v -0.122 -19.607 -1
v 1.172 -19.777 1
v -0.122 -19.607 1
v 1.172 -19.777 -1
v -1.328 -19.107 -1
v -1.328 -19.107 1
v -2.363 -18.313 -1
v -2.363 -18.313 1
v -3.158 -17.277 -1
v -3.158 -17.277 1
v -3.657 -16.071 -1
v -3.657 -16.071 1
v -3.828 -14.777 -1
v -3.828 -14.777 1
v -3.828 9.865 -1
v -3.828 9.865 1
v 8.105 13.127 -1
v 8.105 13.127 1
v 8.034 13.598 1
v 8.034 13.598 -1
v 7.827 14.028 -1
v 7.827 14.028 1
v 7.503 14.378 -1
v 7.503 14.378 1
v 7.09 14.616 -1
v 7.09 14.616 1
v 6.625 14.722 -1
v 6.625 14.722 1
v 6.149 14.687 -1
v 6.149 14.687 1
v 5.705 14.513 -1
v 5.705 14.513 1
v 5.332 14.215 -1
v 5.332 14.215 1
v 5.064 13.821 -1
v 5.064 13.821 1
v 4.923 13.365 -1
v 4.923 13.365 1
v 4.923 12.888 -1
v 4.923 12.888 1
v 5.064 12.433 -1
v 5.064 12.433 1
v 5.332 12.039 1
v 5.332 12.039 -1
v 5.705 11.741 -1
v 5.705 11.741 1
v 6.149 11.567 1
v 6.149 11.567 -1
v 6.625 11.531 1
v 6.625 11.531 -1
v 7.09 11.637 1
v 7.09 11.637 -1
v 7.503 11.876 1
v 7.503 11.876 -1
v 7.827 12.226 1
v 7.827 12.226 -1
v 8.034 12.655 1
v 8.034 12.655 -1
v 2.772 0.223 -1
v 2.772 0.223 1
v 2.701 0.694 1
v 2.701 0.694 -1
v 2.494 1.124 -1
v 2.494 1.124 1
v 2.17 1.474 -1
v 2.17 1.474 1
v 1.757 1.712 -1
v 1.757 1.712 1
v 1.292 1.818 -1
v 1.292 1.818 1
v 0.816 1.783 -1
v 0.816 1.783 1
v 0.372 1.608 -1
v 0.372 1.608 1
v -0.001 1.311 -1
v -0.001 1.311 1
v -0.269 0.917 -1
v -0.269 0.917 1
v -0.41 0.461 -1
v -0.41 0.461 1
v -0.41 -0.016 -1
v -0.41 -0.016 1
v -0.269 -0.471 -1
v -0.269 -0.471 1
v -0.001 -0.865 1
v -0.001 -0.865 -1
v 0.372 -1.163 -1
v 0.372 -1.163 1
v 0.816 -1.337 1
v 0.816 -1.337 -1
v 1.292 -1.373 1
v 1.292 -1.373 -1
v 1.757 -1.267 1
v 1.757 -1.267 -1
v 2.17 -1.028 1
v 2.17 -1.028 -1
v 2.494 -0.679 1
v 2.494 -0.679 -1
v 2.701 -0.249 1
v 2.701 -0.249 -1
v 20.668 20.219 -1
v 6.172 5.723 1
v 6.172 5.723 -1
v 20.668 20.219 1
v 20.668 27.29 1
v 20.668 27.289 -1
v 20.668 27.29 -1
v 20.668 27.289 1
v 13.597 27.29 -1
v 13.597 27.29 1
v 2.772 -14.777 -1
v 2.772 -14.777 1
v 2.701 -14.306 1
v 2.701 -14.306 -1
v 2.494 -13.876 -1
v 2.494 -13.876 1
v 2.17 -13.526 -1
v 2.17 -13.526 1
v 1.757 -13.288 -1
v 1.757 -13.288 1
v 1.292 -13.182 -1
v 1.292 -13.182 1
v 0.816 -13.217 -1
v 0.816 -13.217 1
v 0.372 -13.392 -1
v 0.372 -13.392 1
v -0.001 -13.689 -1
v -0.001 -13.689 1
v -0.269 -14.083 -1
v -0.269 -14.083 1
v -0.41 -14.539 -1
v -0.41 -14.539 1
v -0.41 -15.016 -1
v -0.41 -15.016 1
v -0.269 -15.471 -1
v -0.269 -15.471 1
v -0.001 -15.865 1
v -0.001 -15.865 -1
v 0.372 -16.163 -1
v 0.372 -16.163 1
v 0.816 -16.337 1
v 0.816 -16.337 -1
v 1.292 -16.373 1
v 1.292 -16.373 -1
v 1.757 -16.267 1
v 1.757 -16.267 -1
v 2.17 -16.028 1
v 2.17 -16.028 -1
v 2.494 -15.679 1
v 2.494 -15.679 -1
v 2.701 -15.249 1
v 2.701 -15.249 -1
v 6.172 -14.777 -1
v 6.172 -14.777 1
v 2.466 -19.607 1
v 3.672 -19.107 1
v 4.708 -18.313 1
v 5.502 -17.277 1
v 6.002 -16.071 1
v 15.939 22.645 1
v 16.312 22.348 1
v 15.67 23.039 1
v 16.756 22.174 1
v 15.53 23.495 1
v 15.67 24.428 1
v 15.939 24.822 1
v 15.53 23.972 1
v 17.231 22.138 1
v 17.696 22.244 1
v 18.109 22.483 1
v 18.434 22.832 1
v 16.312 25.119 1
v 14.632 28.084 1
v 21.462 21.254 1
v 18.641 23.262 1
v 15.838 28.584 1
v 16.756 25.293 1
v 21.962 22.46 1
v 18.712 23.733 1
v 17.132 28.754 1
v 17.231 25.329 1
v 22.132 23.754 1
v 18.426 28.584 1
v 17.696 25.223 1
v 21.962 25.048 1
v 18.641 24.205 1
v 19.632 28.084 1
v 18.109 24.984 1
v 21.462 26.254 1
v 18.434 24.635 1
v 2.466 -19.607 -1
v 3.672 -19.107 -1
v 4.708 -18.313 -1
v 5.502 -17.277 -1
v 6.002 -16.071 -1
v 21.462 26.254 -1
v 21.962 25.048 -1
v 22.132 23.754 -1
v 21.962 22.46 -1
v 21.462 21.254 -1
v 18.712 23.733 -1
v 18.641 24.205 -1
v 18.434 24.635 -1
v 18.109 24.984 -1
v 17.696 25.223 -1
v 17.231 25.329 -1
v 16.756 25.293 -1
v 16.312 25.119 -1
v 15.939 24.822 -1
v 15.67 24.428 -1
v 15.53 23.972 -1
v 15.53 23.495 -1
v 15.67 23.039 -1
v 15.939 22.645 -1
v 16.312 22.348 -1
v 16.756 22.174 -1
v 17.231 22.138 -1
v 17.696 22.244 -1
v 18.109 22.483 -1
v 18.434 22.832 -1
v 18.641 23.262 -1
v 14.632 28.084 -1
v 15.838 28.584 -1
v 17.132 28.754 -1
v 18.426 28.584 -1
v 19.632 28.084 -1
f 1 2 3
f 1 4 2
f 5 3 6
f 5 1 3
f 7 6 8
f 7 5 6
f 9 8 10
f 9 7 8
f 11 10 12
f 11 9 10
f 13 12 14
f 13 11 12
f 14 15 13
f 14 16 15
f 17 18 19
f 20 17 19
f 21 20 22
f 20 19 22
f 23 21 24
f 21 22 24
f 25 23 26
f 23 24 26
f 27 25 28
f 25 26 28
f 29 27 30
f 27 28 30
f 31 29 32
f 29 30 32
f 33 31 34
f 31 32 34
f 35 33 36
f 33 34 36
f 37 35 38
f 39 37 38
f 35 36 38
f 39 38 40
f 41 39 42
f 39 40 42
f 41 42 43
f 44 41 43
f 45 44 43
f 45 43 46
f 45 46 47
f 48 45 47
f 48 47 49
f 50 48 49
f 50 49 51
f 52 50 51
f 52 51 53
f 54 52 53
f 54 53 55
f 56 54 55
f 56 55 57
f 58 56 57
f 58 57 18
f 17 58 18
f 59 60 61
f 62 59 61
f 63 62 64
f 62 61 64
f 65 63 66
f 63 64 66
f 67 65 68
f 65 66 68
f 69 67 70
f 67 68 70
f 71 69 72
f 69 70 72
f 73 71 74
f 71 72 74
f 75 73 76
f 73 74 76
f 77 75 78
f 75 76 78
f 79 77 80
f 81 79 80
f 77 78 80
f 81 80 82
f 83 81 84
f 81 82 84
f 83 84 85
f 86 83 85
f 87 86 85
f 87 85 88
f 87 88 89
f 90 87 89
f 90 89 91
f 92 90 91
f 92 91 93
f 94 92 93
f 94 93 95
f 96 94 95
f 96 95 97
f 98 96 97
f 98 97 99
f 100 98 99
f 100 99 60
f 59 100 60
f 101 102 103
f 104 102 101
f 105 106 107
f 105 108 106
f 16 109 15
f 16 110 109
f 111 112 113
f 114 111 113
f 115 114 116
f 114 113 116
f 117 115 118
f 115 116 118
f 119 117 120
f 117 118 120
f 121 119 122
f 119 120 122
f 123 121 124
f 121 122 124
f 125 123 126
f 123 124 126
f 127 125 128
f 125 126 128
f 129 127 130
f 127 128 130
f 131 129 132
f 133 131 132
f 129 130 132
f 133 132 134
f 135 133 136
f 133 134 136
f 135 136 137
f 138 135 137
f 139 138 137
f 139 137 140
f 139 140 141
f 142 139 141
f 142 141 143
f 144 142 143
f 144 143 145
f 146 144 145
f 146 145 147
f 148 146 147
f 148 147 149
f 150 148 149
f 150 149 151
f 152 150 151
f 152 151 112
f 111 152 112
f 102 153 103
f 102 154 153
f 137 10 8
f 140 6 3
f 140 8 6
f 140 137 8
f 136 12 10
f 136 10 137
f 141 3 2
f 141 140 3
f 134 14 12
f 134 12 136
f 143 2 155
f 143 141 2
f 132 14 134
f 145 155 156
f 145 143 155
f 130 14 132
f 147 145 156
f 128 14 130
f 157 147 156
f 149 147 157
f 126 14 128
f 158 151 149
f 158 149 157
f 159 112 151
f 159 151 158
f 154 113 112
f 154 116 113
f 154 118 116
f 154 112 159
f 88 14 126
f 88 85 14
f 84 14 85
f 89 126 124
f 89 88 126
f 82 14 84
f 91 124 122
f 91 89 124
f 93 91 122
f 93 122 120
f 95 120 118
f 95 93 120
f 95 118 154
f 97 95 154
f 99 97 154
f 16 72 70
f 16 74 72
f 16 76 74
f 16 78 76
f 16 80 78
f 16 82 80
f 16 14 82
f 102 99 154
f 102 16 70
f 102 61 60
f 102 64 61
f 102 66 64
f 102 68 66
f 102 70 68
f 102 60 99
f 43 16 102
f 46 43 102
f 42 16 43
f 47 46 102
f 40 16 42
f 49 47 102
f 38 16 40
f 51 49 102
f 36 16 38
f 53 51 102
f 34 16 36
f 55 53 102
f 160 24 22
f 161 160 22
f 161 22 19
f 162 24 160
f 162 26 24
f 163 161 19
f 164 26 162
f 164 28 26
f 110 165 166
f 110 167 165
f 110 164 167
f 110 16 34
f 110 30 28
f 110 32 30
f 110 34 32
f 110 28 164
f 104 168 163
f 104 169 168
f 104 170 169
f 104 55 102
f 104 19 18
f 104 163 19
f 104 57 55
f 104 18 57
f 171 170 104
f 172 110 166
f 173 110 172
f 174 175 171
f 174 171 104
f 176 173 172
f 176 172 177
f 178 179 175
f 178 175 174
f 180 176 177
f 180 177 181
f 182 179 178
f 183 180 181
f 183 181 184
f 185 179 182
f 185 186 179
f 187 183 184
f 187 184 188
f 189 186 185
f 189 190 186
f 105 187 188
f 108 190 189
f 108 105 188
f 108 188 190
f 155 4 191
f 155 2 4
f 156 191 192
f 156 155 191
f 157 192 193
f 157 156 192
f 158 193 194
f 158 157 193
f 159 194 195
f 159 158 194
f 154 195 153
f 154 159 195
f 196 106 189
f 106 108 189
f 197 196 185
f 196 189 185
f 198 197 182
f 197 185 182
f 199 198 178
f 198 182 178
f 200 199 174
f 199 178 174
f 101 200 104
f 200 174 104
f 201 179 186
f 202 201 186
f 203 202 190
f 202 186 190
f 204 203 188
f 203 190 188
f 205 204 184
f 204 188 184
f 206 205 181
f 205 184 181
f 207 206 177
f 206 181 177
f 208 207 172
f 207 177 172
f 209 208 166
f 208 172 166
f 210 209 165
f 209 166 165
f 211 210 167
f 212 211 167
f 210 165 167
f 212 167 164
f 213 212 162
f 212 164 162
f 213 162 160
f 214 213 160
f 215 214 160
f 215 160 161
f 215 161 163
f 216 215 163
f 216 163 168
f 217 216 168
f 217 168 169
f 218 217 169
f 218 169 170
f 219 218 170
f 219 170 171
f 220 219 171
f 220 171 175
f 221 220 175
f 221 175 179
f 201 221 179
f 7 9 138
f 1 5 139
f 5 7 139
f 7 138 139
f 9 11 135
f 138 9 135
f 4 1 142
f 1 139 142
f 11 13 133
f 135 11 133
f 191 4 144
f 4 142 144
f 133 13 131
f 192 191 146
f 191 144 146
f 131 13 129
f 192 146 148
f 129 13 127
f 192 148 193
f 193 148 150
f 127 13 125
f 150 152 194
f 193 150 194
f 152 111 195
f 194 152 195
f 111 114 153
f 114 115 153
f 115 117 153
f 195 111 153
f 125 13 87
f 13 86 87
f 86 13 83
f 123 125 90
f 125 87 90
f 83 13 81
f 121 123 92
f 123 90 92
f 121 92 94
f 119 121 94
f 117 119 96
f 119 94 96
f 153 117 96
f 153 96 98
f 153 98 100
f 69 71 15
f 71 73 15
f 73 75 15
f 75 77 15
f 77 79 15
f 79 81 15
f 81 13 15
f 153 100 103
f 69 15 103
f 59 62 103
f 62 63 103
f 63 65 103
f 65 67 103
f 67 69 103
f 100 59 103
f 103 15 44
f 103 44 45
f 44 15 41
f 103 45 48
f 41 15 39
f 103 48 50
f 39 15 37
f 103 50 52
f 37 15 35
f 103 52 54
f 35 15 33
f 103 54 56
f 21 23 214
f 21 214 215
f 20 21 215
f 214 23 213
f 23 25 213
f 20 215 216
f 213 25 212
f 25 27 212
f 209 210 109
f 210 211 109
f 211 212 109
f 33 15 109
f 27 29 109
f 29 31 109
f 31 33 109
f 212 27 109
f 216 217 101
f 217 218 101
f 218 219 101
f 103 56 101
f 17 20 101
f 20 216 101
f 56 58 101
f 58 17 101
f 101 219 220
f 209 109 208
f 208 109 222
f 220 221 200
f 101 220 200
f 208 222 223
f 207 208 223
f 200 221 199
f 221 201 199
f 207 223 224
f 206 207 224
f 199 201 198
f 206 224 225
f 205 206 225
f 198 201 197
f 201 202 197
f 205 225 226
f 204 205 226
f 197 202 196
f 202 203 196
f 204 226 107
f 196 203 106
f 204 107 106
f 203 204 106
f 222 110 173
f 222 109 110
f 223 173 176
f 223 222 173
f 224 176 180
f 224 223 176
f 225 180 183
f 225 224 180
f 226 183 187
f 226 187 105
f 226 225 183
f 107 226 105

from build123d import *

# Parameters (mm, degrees)
EXTRUDE_1_DEPTH     = 1
FILLET_1_R          = 5
SKETCH_2_R          = 1.6
CUT_EXTRUDE_1_DEPTH = 37.340563377


with BuildPart() as part:
    # ｽｹｯﾁ1 → ﾎﾞｽ - 押し出し1 (new, symmetric)
    with BuildSketch(Plane.XY):
        Polygon((-3.827856705, 2.446999561), (-3.827856705, -19.777202359), (6.172143295, -19.777202359), (6.172143295, 5.722797641), (24.203366215, 23.754020561), (17.132298403, 30.825088373), (-3.827856705, 9.864933264), align=None)
    extrude(amount=EXTRUDE_1_DEPTH, both=True)

    # ﾌｨﾚｯﾄ1
    fillet_1_edges = [part.edges().sort_by_distance(p)[0] for p in [
        (17.132298403, 30.825088373, 0),
        (-3.827856705, -19.777202359, 0),
        (6.172143295, -19.777202359, 0),
        (24.203366215, 23.754020561, 0),
    ]]
    fillet(fillet_1_edges, radius=FILLET_1_R - 0.0001)  # a hair under: the kernel refuses the full size

    # ｽｹｯﾁ2 → ｶｯﾄ - 押し出し1 (cut, through all)
    with BuildSketch(Plane.XY.offset(1)):
        with Locations((1.172143295, 0.222797641)):
            Circle(SKETCH_2_R)
        with Locations((1.172143295, -14.777202359)):
            Circle(SKETCH_2_R)
        with Locations((6.505160691, 13.126882849)):
            Circle(SKETCH_2_R)
        with Locations((17.111762409, 23.733484566)):
            Circle(SKETCH_2_R)
    extrude(amount=-CUT_EXTRUDE_1_DEPTH, mode=Mode.SUBTRACT)


solid = part.part
